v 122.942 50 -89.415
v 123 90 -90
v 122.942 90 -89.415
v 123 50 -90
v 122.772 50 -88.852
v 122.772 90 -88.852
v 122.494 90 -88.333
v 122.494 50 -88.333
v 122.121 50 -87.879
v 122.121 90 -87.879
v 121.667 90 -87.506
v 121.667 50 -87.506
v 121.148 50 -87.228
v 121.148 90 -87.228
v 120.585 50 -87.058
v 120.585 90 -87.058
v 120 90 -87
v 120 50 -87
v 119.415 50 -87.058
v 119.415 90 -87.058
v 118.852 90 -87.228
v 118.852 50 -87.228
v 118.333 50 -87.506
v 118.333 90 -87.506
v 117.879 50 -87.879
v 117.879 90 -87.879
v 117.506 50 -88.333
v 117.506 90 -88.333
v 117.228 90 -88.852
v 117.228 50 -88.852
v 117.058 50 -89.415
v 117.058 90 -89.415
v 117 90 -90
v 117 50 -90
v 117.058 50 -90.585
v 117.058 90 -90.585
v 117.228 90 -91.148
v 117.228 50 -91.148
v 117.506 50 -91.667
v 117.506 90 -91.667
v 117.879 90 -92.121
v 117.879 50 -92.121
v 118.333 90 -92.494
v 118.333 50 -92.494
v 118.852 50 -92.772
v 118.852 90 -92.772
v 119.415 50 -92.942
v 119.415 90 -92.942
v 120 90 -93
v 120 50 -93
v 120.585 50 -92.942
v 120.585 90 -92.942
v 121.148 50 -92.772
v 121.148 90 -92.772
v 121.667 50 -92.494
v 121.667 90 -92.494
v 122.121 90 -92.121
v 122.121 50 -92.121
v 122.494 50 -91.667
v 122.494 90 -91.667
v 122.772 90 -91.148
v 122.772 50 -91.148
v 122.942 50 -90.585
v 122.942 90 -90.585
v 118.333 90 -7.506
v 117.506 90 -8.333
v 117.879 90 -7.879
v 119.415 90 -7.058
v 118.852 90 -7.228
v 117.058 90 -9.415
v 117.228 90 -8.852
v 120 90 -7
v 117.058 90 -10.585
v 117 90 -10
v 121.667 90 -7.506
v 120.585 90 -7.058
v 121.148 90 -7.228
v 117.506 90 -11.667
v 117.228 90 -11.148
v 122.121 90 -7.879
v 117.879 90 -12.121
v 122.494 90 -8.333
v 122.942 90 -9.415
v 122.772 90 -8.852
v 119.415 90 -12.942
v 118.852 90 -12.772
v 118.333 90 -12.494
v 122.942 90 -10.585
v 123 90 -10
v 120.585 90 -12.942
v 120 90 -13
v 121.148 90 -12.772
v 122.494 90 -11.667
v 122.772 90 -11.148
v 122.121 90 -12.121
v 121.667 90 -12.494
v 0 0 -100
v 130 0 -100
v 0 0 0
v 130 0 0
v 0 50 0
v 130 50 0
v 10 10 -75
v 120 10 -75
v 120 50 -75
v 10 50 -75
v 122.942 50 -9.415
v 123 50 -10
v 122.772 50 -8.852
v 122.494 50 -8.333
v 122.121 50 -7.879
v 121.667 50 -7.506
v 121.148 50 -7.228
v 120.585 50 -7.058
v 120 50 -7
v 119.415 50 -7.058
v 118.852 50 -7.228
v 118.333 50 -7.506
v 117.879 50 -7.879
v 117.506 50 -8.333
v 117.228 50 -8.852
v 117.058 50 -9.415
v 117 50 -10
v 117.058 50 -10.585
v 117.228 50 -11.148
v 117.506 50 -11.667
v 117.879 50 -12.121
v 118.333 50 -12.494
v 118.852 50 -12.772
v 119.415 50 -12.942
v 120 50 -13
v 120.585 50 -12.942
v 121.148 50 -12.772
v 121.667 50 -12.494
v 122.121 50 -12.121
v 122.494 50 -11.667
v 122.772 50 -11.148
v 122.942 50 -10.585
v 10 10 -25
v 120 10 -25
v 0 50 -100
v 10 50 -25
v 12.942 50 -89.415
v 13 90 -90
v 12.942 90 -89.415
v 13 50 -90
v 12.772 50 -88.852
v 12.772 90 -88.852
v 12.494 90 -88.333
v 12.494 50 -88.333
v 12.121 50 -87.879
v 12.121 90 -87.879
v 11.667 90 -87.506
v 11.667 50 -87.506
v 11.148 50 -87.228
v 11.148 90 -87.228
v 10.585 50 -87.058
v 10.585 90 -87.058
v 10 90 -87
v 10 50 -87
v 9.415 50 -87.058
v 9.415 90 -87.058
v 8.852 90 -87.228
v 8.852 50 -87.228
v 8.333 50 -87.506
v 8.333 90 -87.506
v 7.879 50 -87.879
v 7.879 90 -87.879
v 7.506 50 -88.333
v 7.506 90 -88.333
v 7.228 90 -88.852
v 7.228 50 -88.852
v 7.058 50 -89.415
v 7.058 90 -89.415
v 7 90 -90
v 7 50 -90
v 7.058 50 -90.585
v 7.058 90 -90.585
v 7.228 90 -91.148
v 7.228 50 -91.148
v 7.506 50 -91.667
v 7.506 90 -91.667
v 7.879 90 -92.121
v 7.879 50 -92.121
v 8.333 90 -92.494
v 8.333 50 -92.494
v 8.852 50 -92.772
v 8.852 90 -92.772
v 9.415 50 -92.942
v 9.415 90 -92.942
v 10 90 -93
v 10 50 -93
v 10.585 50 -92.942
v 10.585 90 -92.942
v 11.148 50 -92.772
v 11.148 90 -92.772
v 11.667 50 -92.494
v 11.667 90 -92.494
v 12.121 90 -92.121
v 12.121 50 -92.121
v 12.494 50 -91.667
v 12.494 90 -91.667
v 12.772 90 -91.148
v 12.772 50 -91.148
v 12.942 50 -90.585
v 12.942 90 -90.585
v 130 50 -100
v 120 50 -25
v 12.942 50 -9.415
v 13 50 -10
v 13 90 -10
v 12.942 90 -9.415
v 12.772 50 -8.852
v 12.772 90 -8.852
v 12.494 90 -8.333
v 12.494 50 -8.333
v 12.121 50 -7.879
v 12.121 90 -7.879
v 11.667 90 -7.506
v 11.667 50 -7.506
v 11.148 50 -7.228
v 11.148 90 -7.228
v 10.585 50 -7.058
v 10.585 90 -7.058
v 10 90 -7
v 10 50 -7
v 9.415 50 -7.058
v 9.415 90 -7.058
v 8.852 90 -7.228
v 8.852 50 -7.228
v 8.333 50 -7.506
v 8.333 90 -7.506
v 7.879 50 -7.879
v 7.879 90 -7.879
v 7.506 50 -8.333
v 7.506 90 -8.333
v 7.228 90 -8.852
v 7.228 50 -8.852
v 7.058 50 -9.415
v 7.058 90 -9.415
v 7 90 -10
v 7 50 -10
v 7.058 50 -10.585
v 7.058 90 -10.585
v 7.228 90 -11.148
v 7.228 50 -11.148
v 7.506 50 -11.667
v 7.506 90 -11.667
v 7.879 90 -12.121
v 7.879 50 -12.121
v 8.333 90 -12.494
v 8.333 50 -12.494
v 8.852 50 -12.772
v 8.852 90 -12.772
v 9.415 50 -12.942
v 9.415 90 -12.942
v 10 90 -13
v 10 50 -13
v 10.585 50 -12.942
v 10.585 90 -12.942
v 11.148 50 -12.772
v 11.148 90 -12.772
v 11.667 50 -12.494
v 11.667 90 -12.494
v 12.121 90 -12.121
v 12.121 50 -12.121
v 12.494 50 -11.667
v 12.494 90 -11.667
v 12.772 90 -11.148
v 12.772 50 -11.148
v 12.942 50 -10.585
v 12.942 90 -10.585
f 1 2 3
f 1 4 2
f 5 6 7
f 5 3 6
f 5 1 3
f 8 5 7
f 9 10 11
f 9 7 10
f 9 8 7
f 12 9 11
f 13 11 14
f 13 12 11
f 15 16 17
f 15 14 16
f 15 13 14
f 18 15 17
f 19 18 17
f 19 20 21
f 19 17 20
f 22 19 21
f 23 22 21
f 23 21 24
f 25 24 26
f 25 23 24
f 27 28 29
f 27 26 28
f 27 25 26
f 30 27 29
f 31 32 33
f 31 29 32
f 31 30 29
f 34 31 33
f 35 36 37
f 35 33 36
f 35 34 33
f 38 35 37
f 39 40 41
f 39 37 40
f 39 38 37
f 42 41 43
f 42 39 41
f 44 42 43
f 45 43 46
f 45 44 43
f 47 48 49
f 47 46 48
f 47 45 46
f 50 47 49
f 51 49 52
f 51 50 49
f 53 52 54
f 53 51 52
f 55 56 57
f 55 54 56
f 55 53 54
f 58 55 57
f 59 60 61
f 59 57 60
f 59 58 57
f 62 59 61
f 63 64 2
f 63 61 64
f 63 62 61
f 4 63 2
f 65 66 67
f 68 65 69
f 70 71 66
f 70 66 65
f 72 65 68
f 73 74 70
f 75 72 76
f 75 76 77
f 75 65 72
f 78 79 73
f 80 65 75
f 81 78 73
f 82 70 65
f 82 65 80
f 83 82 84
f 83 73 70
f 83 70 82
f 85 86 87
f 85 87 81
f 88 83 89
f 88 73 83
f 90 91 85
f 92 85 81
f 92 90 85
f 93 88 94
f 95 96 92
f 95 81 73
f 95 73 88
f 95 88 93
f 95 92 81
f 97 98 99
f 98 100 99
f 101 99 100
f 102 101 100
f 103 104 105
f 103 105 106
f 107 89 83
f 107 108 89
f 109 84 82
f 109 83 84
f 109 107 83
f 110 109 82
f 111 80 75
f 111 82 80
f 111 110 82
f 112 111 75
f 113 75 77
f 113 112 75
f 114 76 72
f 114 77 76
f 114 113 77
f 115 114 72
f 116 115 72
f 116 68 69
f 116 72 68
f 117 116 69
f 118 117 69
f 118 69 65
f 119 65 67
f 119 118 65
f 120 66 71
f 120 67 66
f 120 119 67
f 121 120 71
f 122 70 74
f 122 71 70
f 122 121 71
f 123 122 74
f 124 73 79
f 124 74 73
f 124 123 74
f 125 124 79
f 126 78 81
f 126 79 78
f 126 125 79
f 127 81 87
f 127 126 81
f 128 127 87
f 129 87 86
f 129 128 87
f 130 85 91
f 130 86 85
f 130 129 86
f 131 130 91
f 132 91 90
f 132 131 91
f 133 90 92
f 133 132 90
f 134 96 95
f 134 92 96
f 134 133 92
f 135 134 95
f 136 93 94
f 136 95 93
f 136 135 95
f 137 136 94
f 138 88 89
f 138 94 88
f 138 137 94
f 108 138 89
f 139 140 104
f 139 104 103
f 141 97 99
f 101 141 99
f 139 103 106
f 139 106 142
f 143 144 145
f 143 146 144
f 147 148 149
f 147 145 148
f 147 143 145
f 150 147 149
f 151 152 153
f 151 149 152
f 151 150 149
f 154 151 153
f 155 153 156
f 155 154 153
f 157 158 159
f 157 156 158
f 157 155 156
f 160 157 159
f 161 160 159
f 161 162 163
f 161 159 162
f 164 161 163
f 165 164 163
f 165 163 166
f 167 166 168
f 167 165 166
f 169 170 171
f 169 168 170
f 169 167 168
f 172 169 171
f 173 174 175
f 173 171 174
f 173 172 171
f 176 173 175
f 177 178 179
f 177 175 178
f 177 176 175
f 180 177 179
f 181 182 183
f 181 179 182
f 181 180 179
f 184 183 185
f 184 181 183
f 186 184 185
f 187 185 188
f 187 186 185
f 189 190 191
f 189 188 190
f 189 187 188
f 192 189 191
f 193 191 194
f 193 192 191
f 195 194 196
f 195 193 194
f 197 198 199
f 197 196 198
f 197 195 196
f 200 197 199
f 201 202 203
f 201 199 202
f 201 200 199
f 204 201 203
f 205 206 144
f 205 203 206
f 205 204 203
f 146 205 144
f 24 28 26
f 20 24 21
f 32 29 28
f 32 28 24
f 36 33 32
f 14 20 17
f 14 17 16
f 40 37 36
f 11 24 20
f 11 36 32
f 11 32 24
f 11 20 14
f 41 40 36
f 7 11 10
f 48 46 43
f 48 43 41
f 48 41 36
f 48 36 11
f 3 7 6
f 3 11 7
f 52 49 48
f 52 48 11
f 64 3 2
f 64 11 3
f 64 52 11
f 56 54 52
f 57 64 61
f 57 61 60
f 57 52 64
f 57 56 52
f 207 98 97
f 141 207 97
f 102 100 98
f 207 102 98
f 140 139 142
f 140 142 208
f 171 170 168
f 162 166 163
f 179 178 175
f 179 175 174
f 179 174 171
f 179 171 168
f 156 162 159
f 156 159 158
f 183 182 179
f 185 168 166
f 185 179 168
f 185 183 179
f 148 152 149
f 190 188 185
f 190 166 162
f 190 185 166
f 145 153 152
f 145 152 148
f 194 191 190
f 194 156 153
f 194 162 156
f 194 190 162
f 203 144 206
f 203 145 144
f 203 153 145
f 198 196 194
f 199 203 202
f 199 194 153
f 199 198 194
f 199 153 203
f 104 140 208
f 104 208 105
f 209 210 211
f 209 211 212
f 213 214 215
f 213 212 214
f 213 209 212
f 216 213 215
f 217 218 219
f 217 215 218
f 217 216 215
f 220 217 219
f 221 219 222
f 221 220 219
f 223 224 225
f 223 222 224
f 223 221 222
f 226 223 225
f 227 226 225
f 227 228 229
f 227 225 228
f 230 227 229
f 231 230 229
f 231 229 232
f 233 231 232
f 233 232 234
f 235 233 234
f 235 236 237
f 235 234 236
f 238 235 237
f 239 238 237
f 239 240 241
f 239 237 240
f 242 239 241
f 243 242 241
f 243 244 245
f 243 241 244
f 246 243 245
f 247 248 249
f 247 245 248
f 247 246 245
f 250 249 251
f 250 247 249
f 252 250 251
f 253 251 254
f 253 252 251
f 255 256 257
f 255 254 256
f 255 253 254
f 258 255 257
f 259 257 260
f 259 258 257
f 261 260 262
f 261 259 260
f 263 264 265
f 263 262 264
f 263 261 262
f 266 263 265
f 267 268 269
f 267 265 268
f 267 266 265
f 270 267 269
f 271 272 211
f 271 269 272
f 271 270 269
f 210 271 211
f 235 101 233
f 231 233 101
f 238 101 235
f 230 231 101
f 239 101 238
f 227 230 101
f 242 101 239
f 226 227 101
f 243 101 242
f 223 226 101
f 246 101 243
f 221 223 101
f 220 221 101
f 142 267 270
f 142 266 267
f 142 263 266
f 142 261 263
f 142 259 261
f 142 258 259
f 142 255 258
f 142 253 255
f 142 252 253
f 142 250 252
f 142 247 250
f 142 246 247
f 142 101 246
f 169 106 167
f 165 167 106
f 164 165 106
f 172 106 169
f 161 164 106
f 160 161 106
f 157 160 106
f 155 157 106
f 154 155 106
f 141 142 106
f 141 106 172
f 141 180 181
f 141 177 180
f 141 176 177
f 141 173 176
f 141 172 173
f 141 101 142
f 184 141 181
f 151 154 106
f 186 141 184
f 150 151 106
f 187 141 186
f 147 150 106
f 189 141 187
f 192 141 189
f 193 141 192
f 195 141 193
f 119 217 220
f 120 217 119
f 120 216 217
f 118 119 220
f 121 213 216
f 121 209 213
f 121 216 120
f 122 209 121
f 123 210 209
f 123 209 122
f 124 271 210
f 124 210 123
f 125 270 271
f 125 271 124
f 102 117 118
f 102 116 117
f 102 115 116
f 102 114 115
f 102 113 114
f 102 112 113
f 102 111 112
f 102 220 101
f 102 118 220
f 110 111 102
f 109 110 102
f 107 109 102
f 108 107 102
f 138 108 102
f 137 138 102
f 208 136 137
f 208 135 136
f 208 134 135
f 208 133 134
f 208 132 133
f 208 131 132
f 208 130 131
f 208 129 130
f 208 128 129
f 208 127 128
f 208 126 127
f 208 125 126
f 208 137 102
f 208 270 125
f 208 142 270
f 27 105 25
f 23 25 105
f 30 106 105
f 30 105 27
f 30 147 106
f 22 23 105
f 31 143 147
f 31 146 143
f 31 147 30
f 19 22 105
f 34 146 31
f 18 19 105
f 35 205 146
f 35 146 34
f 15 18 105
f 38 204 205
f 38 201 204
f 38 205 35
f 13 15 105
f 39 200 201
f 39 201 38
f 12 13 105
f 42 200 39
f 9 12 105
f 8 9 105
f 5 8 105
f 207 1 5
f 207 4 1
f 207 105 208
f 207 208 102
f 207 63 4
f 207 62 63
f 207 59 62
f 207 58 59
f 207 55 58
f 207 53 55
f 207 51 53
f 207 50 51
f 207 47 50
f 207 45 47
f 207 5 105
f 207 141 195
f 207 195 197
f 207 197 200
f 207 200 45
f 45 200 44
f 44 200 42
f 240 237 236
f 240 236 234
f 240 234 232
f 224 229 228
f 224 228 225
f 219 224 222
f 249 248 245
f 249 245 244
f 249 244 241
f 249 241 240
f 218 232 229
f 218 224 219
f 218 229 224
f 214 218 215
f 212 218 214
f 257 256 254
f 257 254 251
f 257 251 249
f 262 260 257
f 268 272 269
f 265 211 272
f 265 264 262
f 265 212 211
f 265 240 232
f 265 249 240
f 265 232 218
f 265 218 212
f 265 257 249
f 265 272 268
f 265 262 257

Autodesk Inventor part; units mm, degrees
ref_plane "YZ Plane" through (0, 0, 0) normal (1, 0, 0) x (0, 1, 0)
ref_plane "XZ Plane" through (0, 0, 0) normal (0, 1, 0) x (-1, 0, 0)
ref_plane "XY Plane" through (0, 0, 0) normal (0, 0, 1) x (1, 0, 0)
sketch "Sketch1" plane through (0, 0, 0) normal (0, 1, 0) x (-1, 0, 0)
  line L0 (0, 0) -> (-130, 0)
  line L1 (-130, 0) -> (-130, -100)
  line L2 (-130, -100) -> (0, -100)
  line L3 (0, -100) -> (0, 0)
  dimension "d0" = 130
  dimension "d1" = 100
extrude "Extrusion1" add sketch "Sketch1" along normal blind 10
sketch "Sketch2" plane through (0, 10, 0) normal (0, 1, 0) x (1, 0, 0)
  line L0 (10, 25) -> (120, 25)
  line L1 (120, 25) -> (120, 75)
  line L2 (120, 75) -> (10, 75)
  line L3 (10, 75) -> (10, 25)
  line L4 (130, 100) -> (0, 100) projected
  line L5 (130, 0) -> (130, 100) projected
  line L6 (0, 100) -> (0, 0) projected
  line L7 (0, 0) -> (130, 0) projected
  dimension "d4" = 25
  dimension "d5" = 10
  dimension "d6" = 10
  dimension "d7" = 25
extrude "Extrusion2" add sketch "Sketch2" along normal blind 40
sketch "Sketch3" plane through (0, 50, 0) normal (0, 1, 0) x (1, 0, 0)
  circle A0 centre (10, 90) radius 3
  line L0 (130, 100) -> (0, 100) projected
  line L1 (0, 100) -> (0, 0) projected
  line L2 (130, 0) -> (130, 100) projected
  line L3 (130, 100) -> (0, 100) projected
  line L4 (65, 100) -> (65, 0)
  line L5 (0, 0) -> (130, 0) projected
  line L6 (0, 100) -> (0, 0) projected
  line L7 (0, 50) -> (130, 50)
  circle A1 centre (120, 90) radius 3
  circle A2 centre (10, 10) radius 3
  line L8 (130, 0) -> (0, 0)
  line L9 (130, 0) -> (0, 0)
  circle A3 centre (120, 10) radius 3
  dimension "d10" = 6
  dimension "d11" = 10
  dimension "d12" = 10
extrude "Extrusion3" add sketch "Sketch3" along normal blind 40 contours A0 | A1 | A2 | A3
properties part number "bottom"
